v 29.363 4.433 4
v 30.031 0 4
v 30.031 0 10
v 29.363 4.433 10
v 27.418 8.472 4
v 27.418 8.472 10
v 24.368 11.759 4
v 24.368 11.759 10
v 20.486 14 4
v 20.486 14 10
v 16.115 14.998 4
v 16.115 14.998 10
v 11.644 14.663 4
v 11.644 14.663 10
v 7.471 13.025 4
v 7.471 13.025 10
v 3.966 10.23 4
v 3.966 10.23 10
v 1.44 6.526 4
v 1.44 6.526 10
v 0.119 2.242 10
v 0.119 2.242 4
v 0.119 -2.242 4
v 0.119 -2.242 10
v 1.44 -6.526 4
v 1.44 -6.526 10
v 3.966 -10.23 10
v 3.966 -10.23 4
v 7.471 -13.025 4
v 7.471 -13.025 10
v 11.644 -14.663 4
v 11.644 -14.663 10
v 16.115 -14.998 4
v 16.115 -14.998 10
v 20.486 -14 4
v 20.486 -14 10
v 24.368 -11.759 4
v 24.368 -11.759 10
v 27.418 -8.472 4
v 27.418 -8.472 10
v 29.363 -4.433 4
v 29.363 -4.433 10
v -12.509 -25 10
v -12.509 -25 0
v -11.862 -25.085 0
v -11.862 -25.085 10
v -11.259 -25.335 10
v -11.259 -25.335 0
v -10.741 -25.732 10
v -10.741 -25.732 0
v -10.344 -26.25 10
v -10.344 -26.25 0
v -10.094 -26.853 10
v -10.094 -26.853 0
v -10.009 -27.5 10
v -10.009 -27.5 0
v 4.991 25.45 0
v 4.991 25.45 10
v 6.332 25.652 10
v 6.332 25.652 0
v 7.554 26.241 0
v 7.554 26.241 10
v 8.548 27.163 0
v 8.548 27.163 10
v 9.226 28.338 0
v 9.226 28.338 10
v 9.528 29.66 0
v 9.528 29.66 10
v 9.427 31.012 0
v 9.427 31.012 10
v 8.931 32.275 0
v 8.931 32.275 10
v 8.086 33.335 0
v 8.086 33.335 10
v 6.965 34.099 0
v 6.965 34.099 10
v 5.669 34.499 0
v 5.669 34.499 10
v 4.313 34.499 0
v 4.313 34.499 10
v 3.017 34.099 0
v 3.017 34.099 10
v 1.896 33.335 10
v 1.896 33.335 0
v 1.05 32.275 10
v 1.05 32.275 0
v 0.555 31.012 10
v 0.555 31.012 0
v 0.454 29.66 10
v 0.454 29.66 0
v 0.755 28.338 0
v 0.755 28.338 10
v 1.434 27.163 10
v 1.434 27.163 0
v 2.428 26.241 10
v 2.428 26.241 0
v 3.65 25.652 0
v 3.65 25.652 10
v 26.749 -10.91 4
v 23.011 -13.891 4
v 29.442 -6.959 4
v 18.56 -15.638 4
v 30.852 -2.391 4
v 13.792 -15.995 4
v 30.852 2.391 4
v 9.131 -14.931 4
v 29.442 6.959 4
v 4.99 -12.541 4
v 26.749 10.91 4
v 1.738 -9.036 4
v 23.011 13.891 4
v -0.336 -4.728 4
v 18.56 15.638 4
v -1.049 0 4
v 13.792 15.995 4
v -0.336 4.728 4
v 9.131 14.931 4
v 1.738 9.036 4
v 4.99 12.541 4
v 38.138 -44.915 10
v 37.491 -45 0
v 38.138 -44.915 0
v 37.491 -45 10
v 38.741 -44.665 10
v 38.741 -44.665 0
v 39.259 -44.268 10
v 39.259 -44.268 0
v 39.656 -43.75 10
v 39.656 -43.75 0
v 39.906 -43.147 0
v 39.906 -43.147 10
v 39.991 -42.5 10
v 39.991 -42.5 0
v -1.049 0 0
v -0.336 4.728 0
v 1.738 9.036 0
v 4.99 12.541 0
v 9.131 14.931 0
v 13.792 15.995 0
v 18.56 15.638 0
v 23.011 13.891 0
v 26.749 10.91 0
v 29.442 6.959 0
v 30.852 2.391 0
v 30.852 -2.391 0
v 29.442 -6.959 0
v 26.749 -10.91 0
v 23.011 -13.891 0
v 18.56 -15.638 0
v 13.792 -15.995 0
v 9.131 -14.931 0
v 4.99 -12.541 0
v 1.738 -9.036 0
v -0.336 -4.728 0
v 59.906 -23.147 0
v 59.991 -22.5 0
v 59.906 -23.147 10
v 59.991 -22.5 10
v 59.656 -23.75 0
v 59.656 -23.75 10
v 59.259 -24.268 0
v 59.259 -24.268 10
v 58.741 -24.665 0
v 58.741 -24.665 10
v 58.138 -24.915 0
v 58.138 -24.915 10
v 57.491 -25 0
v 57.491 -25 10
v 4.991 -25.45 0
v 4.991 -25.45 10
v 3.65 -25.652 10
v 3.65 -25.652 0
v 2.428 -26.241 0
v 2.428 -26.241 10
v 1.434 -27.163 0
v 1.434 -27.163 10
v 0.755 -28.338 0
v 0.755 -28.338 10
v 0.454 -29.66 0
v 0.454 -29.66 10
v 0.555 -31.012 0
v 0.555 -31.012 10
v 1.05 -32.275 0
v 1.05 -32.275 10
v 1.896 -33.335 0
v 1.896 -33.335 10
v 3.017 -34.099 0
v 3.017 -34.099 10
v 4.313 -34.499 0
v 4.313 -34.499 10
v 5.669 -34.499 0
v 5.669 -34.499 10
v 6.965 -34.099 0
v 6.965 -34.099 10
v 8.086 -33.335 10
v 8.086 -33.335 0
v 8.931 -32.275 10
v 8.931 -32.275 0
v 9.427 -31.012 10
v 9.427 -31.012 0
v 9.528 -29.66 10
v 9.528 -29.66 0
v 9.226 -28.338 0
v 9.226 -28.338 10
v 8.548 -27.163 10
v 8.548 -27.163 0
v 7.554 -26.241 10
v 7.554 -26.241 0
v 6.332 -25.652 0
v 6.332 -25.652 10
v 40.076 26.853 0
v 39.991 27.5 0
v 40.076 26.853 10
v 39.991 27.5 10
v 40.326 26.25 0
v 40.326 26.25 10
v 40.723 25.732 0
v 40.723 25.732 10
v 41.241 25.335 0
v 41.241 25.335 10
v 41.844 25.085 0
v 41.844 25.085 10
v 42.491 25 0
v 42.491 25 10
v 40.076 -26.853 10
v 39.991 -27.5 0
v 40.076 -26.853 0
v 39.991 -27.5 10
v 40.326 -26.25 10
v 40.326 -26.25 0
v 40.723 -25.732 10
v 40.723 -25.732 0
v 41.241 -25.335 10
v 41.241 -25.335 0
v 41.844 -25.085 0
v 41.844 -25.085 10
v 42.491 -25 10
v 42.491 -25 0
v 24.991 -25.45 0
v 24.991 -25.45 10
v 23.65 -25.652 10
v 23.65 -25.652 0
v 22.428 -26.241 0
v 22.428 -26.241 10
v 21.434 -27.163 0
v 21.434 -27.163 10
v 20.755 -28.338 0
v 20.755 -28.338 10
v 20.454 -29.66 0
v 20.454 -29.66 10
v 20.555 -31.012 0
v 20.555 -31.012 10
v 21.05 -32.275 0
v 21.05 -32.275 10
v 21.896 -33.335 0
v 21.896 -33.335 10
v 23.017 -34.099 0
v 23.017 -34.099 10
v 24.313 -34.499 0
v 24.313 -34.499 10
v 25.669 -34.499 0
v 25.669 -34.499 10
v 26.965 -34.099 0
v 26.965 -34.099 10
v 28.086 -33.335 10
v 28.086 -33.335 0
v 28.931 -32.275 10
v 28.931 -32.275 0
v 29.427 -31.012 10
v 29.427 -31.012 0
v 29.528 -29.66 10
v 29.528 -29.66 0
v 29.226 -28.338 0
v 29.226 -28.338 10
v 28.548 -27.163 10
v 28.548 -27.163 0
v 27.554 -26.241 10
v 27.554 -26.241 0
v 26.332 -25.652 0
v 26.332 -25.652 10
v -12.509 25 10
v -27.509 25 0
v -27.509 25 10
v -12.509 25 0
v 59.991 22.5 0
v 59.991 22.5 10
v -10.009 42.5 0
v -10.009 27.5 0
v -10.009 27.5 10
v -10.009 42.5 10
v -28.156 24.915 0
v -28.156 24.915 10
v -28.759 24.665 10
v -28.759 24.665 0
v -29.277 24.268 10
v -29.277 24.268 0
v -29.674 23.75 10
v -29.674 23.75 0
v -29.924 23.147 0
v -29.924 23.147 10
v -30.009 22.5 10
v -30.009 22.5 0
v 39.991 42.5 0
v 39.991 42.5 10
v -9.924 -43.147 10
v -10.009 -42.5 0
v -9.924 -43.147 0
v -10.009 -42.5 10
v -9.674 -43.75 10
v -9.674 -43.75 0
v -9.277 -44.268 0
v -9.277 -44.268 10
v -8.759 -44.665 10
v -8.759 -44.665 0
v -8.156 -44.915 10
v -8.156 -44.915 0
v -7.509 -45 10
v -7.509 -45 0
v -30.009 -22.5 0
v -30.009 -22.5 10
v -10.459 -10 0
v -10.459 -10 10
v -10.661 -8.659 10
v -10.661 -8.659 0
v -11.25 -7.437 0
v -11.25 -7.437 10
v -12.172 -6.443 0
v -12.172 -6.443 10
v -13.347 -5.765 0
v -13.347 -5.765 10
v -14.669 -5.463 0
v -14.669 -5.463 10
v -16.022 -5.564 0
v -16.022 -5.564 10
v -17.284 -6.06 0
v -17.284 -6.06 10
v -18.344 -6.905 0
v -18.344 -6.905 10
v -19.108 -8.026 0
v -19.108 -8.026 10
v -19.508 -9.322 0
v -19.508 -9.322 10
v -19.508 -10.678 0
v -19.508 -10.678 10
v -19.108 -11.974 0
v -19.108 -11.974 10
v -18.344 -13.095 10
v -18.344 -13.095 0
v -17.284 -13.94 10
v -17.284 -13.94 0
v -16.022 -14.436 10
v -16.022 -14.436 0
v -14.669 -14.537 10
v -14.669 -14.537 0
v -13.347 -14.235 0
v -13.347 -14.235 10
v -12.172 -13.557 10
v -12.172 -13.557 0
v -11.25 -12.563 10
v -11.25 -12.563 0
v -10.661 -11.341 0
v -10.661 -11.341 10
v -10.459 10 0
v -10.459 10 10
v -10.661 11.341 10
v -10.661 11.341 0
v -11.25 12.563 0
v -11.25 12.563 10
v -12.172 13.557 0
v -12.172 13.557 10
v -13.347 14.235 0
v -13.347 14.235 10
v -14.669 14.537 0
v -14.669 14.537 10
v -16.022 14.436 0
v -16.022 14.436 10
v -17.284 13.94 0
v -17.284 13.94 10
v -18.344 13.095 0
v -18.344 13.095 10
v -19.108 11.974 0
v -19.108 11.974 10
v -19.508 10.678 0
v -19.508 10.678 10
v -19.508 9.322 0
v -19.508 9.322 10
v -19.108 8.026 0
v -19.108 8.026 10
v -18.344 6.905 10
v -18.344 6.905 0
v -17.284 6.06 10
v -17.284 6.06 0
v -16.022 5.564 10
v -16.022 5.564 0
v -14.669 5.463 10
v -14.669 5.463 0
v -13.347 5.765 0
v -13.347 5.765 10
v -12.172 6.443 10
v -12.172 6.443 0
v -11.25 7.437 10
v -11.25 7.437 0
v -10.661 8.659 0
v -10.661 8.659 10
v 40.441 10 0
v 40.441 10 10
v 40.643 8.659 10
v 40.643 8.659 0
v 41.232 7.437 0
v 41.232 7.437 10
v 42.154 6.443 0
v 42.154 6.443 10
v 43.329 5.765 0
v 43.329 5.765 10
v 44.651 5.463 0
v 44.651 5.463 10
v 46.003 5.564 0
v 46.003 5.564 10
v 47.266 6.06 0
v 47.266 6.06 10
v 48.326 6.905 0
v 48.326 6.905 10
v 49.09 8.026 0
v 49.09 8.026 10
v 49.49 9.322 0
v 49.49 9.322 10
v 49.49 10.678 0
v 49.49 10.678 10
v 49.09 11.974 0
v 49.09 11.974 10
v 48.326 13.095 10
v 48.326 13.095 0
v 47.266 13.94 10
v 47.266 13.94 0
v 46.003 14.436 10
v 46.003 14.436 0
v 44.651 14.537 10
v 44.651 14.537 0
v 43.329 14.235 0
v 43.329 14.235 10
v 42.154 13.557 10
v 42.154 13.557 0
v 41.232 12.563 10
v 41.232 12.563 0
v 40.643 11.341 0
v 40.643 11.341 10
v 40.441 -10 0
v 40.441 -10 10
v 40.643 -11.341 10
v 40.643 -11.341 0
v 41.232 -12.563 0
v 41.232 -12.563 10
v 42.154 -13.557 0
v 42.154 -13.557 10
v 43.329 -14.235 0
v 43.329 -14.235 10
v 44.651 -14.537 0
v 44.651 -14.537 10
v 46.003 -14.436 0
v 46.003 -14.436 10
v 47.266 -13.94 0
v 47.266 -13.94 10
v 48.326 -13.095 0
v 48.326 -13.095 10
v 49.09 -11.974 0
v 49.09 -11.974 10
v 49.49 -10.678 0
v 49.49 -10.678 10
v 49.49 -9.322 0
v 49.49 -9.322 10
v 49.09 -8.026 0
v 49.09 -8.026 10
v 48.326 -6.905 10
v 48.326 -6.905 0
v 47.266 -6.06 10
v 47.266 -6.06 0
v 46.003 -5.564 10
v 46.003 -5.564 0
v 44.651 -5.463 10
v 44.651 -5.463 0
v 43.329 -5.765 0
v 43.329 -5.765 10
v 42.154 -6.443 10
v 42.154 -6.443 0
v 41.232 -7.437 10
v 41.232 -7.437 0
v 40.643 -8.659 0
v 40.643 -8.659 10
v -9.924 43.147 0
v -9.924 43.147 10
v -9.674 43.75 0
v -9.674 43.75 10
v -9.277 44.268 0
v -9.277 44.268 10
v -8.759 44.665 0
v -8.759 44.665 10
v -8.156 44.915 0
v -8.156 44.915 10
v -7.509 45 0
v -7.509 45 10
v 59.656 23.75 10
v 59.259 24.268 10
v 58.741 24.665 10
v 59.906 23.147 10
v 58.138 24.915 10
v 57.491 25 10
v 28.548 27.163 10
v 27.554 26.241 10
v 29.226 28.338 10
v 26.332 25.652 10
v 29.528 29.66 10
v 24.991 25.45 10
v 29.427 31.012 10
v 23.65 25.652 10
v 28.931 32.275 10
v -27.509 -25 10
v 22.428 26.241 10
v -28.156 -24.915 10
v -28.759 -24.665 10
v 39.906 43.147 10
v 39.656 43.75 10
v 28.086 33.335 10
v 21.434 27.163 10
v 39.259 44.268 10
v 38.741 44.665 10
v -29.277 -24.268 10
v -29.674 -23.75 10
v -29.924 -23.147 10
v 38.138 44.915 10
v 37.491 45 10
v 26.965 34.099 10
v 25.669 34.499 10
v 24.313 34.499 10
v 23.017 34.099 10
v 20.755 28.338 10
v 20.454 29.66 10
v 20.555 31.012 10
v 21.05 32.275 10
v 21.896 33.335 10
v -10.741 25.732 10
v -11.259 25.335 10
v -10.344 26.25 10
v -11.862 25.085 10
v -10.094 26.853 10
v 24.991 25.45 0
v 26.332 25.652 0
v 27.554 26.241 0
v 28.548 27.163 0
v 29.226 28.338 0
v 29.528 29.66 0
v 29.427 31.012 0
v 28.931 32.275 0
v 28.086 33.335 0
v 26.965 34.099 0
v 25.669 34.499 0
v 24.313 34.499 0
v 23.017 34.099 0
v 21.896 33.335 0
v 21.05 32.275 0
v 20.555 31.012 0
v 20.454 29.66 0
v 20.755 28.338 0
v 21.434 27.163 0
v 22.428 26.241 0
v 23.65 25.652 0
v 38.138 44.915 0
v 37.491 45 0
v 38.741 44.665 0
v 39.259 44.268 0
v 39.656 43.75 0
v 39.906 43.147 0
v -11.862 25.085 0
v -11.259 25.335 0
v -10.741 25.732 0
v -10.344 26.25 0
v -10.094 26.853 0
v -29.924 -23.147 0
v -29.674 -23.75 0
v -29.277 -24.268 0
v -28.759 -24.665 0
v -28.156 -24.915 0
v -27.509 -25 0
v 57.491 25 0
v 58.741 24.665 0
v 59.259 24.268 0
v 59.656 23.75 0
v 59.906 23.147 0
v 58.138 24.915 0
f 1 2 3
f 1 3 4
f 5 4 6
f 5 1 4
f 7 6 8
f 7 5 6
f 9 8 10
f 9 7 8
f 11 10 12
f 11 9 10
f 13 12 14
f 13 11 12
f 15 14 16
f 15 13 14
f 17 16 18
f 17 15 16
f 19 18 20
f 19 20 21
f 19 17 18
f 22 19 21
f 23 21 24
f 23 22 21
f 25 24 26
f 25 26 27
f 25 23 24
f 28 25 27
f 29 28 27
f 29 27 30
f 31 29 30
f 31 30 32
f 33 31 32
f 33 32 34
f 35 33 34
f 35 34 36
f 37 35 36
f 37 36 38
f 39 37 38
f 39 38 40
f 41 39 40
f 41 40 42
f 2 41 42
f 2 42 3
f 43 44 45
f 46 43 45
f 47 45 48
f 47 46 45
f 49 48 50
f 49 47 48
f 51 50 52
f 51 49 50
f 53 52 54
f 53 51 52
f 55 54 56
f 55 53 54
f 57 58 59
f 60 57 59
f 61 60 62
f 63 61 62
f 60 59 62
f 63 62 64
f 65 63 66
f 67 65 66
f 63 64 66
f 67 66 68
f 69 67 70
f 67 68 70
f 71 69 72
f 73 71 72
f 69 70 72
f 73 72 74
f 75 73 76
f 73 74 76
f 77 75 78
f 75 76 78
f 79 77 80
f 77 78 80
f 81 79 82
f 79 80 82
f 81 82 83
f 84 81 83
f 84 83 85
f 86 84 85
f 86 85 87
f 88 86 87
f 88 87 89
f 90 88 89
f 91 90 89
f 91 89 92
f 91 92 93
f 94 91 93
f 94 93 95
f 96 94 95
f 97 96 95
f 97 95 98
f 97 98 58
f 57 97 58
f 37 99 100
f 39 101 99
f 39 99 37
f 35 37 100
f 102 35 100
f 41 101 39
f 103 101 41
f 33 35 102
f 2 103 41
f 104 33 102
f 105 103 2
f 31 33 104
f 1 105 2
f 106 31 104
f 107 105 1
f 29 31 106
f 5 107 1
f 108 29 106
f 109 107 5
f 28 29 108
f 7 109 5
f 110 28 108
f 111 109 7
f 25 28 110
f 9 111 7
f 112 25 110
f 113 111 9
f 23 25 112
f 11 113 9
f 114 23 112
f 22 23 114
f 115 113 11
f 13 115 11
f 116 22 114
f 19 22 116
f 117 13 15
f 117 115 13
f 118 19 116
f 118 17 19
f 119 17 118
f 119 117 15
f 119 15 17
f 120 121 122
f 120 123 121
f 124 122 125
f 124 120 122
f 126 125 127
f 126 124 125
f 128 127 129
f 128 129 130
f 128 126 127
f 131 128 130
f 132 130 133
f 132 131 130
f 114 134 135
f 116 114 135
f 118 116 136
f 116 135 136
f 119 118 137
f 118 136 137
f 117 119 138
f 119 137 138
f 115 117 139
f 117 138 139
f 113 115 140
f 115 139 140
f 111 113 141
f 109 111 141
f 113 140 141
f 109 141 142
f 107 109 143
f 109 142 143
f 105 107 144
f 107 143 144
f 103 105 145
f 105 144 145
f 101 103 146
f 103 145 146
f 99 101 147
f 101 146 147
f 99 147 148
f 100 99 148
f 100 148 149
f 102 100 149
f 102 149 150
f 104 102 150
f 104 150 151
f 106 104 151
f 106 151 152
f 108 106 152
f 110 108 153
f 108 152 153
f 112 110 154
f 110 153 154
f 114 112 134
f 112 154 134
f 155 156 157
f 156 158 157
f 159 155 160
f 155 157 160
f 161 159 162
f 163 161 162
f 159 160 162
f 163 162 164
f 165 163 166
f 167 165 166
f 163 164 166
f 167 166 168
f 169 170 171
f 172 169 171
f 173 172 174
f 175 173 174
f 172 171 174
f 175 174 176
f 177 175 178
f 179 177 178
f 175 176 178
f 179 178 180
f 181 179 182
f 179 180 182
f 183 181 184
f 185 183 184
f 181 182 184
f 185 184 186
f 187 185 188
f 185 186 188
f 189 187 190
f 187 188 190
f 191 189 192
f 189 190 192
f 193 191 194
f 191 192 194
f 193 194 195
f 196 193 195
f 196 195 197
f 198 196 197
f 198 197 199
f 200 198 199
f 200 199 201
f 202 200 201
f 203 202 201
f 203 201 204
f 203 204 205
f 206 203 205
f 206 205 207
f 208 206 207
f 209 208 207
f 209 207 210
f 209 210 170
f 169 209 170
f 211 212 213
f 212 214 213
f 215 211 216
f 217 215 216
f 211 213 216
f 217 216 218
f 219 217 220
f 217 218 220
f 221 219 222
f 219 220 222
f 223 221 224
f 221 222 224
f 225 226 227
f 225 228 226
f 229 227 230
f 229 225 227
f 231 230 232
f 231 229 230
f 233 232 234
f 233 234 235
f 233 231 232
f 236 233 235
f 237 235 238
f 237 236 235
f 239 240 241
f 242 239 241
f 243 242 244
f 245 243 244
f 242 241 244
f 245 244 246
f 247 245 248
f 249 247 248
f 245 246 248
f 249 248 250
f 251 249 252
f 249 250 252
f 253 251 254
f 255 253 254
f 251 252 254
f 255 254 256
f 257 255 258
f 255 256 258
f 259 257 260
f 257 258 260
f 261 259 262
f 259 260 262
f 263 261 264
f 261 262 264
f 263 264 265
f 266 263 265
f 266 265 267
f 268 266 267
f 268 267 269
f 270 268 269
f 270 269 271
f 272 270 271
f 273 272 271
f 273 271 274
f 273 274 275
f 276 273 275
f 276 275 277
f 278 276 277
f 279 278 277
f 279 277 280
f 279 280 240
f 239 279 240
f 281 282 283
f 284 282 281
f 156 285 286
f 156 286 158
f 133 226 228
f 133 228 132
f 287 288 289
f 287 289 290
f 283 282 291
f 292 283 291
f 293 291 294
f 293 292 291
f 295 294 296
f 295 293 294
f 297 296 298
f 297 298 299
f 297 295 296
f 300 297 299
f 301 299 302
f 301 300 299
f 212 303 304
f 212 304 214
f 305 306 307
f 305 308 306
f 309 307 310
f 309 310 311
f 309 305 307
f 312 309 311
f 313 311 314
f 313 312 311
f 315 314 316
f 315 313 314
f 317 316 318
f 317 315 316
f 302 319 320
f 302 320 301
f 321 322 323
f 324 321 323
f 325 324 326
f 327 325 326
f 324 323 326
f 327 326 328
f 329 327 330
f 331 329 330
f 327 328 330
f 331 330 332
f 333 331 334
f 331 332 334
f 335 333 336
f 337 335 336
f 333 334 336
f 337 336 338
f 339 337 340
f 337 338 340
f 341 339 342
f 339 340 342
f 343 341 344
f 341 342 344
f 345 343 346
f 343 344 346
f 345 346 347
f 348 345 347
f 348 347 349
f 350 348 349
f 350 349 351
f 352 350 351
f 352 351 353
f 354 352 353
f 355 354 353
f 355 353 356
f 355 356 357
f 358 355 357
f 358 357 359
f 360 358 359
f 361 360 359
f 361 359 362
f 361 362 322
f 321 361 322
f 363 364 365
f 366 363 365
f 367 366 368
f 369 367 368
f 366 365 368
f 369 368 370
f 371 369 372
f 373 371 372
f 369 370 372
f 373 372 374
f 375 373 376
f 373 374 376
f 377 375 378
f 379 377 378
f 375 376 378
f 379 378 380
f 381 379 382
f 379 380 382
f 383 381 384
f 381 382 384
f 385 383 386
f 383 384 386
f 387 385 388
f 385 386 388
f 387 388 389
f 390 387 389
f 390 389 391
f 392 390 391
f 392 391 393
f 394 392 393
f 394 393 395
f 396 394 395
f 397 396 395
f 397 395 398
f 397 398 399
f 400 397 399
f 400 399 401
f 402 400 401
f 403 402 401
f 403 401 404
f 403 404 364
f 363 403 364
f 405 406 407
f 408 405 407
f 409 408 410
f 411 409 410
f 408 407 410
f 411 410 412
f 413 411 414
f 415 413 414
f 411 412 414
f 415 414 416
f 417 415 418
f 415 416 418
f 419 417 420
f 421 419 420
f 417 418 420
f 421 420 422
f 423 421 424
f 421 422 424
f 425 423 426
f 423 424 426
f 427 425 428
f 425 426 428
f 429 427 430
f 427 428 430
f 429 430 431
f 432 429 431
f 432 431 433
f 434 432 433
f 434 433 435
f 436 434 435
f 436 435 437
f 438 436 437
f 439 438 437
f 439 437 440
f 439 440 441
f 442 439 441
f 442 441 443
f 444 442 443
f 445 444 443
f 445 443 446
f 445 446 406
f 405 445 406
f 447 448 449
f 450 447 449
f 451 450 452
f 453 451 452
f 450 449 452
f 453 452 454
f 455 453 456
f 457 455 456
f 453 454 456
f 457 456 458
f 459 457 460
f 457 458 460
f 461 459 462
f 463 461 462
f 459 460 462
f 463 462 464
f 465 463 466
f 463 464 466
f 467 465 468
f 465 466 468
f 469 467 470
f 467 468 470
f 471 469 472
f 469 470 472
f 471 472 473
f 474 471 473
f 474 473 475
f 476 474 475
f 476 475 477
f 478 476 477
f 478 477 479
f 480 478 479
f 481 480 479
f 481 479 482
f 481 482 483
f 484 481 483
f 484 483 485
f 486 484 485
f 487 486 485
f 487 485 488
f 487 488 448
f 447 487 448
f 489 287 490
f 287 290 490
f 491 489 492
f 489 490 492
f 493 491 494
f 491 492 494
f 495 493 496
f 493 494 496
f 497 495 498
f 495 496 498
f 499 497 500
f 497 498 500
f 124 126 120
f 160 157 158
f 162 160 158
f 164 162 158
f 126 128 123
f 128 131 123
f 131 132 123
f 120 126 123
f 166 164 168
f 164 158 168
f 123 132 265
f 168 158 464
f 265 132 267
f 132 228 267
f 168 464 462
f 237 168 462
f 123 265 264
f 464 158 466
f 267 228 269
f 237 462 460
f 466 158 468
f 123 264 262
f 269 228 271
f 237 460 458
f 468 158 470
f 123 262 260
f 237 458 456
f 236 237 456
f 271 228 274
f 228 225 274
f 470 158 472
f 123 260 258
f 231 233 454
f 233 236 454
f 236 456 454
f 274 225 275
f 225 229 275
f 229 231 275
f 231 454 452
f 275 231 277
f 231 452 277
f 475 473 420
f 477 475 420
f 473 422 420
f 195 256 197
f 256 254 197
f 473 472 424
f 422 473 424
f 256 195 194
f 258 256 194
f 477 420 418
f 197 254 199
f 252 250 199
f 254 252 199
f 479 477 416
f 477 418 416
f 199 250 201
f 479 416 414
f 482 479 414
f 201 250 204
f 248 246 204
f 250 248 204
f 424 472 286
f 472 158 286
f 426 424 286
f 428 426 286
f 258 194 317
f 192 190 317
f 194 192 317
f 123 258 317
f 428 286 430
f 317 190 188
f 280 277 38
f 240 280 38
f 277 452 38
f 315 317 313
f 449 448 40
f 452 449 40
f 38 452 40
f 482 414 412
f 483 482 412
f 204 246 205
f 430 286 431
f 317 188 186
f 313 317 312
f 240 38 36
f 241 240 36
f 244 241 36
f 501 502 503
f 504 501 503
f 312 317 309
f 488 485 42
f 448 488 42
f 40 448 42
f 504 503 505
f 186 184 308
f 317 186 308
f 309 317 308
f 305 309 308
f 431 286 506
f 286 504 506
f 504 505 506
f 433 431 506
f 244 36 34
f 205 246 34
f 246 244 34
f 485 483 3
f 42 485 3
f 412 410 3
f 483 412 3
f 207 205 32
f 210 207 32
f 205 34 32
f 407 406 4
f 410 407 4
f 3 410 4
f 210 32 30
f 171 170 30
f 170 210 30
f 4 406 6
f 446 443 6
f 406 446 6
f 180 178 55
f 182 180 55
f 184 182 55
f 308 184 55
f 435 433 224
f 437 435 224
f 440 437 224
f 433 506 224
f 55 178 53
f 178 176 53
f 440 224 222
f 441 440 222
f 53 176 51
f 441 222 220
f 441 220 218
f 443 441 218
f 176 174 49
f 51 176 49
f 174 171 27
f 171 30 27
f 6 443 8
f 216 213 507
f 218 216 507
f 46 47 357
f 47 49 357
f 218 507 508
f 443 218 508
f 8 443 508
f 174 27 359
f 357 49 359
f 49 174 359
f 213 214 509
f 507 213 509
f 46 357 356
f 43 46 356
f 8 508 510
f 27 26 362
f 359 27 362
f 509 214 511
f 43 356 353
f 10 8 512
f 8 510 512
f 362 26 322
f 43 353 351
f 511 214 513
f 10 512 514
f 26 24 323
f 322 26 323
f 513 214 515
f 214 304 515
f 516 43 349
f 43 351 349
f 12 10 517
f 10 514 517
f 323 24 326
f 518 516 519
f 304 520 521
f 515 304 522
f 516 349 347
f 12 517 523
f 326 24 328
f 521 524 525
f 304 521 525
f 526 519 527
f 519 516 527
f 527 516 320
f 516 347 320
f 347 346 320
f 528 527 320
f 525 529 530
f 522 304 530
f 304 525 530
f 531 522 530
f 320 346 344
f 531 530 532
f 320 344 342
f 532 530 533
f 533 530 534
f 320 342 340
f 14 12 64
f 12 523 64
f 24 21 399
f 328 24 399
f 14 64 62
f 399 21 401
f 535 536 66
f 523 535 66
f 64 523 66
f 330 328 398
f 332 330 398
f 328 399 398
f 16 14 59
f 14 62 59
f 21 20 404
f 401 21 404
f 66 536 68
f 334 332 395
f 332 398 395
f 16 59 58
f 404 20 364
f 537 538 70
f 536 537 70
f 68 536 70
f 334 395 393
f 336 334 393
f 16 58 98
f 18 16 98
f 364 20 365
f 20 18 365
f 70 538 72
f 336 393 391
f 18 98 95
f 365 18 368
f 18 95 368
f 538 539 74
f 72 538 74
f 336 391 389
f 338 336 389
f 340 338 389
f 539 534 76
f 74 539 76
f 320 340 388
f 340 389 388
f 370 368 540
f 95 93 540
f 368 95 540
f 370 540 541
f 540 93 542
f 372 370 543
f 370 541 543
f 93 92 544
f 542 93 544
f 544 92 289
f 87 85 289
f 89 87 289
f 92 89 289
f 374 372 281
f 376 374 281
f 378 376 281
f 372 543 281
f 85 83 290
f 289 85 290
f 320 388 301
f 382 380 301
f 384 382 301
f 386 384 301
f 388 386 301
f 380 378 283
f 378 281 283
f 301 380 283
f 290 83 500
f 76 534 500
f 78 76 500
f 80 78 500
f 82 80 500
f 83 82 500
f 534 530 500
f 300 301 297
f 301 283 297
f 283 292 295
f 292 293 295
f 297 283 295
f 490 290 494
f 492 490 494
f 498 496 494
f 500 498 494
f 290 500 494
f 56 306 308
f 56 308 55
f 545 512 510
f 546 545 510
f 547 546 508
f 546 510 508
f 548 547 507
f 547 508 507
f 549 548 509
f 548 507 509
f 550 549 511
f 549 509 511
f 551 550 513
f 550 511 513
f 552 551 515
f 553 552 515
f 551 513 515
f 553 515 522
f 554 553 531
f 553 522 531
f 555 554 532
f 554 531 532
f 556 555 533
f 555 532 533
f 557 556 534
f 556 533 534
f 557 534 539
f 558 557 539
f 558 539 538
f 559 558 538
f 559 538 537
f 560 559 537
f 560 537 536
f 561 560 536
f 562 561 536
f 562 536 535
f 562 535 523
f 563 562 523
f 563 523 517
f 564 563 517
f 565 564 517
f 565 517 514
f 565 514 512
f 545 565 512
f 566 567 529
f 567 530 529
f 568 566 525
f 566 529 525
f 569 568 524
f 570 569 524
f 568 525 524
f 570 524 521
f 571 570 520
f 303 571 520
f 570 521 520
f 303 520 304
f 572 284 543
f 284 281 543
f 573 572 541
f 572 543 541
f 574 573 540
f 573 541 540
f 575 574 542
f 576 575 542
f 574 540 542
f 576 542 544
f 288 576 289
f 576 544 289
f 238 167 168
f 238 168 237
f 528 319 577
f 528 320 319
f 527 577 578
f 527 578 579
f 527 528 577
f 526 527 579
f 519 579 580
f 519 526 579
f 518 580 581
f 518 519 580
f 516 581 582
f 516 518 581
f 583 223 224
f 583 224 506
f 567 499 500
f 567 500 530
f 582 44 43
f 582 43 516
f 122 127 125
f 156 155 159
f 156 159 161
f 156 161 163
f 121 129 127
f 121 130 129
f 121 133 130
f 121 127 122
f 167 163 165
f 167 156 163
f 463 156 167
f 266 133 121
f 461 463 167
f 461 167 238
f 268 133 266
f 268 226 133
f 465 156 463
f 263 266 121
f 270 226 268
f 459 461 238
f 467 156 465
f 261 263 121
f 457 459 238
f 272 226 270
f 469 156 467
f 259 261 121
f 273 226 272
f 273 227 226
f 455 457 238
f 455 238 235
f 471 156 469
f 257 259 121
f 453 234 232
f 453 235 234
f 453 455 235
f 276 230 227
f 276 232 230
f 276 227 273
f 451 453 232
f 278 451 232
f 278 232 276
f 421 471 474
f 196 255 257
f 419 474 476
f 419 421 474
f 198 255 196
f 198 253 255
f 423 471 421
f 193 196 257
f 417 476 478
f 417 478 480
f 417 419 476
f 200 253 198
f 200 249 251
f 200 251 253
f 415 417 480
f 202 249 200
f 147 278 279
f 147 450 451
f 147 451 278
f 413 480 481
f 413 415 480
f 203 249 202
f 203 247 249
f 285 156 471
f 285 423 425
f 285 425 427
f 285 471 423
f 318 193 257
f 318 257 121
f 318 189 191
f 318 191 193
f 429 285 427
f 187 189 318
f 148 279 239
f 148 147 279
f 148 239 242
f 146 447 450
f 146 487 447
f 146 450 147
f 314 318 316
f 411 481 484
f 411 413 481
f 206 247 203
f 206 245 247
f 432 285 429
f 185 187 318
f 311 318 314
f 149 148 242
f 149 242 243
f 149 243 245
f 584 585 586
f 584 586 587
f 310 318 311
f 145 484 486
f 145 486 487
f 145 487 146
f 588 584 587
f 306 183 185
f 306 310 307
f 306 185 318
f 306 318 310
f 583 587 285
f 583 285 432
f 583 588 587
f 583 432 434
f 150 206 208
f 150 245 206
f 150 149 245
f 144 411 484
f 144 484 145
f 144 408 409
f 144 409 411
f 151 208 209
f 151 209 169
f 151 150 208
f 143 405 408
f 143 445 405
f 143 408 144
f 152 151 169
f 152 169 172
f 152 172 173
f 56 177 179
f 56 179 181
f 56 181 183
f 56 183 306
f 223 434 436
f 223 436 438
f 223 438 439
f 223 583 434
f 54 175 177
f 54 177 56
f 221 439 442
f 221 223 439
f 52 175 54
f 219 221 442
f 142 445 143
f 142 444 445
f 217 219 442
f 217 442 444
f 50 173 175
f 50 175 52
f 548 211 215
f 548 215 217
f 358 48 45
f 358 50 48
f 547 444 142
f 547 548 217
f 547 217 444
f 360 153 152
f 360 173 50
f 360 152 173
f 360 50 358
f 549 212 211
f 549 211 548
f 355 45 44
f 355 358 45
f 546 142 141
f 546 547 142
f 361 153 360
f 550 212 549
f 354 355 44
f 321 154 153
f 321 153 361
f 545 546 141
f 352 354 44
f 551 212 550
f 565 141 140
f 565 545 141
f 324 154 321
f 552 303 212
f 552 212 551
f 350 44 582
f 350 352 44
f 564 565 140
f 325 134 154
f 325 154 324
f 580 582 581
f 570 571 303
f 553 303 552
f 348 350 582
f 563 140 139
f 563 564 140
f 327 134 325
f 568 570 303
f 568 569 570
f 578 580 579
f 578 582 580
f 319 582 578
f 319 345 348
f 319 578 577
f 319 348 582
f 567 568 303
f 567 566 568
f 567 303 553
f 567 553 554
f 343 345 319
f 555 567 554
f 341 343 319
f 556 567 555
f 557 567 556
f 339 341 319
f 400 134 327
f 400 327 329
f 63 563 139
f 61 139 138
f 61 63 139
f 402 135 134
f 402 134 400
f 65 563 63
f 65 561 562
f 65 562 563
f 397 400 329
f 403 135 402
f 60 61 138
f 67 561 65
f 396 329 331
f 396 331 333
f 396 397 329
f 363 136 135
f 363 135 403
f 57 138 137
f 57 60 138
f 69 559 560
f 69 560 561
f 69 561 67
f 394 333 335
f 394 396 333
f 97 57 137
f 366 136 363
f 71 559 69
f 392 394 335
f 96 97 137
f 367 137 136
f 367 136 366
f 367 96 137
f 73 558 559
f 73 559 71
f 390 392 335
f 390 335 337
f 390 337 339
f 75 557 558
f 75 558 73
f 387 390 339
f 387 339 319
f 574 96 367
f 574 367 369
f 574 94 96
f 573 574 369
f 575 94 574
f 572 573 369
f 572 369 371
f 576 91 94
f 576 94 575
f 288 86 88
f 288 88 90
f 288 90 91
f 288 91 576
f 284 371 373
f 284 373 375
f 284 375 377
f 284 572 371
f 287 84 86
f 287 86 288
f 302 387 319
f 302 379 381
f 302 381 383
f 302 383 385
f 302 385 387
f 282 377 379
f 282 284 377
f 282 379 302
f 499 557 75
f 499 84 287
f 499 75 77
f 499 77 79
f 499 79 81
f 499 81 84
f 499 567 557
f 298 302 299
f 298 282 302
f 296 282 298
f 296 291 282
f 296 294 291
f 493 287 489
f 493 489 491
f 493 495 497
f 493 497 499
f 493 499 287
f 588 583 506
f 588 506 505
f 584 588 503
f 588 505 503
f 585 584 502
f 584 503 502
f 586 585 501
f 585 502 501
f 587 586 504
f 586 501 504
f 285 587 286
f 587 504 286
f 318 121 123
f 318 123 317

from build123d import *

# Parameters (mm, degrees)
SKETCH_1_R               = 15.04
EXTRUDE_1_DEPTH          = 10
FILLET_1_R               = 2.5
SKETCH_2_R               = 16.04
CUT_EXTRUDE_1_DEPTH      = 4
FILLET_2_R               = 2.5
SKETCH_5_R               = 4.55
CUT_EXTRUDE_2_DEPTH      = 76.6565237
PATTERN_CIRCULAR_1_COUNT = 4


with BuildPart() as part:
    # 스케치1 → 보스-돌출1 (new body)
    with BuildSketch(Plane.XY):
        Polygon((-30.009087535, 25), (-10.009087535, 25), (-10.009087535, 45), (39.990912465, 45), (39.990912465, 25), (59.990912465, 25), (59.990912465, -25), (39.990912465, -25), (39.990912465, -45), (-10.009087535, -45), (-10.009087535, -25), (-30.009087535, -25), align=None)
        with Locations((14.990912465, 0)):
            Circle(SKETCH_1_R, mode=Mode.SUBTRACT)
    extrude(amount=EXTRUDE_1_DEPTH)

    # 필렛1
    fillet_1_edges = [part.edges().sort_by_distance(p)[0] for p in [
        (-10.009087535, 25, 5),
        (39.990912465, 25, 5),
        (39.990912465, -25, 5),
        (-10.009087535, -25, 5),
    ]]
    fillet(fillet_1_edges, radius=FILLET_1_R)

    # 스케치2 → 컷-돌출1 (cut)
    with BuildSketch(Plane(origin=(0, 0, 0), x_dir=(-1, 0, 0), z_dir=(0, 0, -1))):
        with Locations((-14.990912465, 0)):
            Circle(SKETCH_2_R)
    extrude(amount=-CUT_EXTRUDE_1_DEPTH, mode=Mode.SUBTRACT)

    # 필렛2
    fillet_2_edges = [part.edges().sort_by_distance(p)[0] for p in [
        (-30.009087535, 25, 5),
        (-10.009087535, 45, 5),
        (39.990912465, 45, 5),
        (59.990912465, 25, 5),
        (59.990912465, -25, 5),
        (39.990912465, -45, 5),
        (-10.009087535, -45, 5),
        (-30.009087535, -25, 5),
    ]]
    fillet(fillet_2_edges, radius=FILLET_2_R)

    # 스케치5 → 컷-돌출2 (cut, through all)
    with BuildSketch(Plane.XY.offset(10)):
        with Locations((-15.009087535, -10)):
            Circle(SKETCH_5_R)
        with Locations((-15.009087535, 10)):
            Circle(SKETCH_5_R)
    cut_extrude_2 = extrude(amount=-CUT_EXTRUDE_2_DEPTH, mode=Mode.SUBTRACT)

    # 원형 패턴1: 컷-돌출2 ×4 about axis
    pattern_circular_1_axis = Axis((14.990912465, 0, 0), (0, 0, 1))
    for i in range(1, PATTERN_CIRCULAR_1_COUNT):
        add(cut_extrude_2.rotate(pattern_circular_1_axis, i * 360 / PATTERN_CIRCULAR_1_COUNT), mode=Mode.SUBTRACT)


solid = part.part
